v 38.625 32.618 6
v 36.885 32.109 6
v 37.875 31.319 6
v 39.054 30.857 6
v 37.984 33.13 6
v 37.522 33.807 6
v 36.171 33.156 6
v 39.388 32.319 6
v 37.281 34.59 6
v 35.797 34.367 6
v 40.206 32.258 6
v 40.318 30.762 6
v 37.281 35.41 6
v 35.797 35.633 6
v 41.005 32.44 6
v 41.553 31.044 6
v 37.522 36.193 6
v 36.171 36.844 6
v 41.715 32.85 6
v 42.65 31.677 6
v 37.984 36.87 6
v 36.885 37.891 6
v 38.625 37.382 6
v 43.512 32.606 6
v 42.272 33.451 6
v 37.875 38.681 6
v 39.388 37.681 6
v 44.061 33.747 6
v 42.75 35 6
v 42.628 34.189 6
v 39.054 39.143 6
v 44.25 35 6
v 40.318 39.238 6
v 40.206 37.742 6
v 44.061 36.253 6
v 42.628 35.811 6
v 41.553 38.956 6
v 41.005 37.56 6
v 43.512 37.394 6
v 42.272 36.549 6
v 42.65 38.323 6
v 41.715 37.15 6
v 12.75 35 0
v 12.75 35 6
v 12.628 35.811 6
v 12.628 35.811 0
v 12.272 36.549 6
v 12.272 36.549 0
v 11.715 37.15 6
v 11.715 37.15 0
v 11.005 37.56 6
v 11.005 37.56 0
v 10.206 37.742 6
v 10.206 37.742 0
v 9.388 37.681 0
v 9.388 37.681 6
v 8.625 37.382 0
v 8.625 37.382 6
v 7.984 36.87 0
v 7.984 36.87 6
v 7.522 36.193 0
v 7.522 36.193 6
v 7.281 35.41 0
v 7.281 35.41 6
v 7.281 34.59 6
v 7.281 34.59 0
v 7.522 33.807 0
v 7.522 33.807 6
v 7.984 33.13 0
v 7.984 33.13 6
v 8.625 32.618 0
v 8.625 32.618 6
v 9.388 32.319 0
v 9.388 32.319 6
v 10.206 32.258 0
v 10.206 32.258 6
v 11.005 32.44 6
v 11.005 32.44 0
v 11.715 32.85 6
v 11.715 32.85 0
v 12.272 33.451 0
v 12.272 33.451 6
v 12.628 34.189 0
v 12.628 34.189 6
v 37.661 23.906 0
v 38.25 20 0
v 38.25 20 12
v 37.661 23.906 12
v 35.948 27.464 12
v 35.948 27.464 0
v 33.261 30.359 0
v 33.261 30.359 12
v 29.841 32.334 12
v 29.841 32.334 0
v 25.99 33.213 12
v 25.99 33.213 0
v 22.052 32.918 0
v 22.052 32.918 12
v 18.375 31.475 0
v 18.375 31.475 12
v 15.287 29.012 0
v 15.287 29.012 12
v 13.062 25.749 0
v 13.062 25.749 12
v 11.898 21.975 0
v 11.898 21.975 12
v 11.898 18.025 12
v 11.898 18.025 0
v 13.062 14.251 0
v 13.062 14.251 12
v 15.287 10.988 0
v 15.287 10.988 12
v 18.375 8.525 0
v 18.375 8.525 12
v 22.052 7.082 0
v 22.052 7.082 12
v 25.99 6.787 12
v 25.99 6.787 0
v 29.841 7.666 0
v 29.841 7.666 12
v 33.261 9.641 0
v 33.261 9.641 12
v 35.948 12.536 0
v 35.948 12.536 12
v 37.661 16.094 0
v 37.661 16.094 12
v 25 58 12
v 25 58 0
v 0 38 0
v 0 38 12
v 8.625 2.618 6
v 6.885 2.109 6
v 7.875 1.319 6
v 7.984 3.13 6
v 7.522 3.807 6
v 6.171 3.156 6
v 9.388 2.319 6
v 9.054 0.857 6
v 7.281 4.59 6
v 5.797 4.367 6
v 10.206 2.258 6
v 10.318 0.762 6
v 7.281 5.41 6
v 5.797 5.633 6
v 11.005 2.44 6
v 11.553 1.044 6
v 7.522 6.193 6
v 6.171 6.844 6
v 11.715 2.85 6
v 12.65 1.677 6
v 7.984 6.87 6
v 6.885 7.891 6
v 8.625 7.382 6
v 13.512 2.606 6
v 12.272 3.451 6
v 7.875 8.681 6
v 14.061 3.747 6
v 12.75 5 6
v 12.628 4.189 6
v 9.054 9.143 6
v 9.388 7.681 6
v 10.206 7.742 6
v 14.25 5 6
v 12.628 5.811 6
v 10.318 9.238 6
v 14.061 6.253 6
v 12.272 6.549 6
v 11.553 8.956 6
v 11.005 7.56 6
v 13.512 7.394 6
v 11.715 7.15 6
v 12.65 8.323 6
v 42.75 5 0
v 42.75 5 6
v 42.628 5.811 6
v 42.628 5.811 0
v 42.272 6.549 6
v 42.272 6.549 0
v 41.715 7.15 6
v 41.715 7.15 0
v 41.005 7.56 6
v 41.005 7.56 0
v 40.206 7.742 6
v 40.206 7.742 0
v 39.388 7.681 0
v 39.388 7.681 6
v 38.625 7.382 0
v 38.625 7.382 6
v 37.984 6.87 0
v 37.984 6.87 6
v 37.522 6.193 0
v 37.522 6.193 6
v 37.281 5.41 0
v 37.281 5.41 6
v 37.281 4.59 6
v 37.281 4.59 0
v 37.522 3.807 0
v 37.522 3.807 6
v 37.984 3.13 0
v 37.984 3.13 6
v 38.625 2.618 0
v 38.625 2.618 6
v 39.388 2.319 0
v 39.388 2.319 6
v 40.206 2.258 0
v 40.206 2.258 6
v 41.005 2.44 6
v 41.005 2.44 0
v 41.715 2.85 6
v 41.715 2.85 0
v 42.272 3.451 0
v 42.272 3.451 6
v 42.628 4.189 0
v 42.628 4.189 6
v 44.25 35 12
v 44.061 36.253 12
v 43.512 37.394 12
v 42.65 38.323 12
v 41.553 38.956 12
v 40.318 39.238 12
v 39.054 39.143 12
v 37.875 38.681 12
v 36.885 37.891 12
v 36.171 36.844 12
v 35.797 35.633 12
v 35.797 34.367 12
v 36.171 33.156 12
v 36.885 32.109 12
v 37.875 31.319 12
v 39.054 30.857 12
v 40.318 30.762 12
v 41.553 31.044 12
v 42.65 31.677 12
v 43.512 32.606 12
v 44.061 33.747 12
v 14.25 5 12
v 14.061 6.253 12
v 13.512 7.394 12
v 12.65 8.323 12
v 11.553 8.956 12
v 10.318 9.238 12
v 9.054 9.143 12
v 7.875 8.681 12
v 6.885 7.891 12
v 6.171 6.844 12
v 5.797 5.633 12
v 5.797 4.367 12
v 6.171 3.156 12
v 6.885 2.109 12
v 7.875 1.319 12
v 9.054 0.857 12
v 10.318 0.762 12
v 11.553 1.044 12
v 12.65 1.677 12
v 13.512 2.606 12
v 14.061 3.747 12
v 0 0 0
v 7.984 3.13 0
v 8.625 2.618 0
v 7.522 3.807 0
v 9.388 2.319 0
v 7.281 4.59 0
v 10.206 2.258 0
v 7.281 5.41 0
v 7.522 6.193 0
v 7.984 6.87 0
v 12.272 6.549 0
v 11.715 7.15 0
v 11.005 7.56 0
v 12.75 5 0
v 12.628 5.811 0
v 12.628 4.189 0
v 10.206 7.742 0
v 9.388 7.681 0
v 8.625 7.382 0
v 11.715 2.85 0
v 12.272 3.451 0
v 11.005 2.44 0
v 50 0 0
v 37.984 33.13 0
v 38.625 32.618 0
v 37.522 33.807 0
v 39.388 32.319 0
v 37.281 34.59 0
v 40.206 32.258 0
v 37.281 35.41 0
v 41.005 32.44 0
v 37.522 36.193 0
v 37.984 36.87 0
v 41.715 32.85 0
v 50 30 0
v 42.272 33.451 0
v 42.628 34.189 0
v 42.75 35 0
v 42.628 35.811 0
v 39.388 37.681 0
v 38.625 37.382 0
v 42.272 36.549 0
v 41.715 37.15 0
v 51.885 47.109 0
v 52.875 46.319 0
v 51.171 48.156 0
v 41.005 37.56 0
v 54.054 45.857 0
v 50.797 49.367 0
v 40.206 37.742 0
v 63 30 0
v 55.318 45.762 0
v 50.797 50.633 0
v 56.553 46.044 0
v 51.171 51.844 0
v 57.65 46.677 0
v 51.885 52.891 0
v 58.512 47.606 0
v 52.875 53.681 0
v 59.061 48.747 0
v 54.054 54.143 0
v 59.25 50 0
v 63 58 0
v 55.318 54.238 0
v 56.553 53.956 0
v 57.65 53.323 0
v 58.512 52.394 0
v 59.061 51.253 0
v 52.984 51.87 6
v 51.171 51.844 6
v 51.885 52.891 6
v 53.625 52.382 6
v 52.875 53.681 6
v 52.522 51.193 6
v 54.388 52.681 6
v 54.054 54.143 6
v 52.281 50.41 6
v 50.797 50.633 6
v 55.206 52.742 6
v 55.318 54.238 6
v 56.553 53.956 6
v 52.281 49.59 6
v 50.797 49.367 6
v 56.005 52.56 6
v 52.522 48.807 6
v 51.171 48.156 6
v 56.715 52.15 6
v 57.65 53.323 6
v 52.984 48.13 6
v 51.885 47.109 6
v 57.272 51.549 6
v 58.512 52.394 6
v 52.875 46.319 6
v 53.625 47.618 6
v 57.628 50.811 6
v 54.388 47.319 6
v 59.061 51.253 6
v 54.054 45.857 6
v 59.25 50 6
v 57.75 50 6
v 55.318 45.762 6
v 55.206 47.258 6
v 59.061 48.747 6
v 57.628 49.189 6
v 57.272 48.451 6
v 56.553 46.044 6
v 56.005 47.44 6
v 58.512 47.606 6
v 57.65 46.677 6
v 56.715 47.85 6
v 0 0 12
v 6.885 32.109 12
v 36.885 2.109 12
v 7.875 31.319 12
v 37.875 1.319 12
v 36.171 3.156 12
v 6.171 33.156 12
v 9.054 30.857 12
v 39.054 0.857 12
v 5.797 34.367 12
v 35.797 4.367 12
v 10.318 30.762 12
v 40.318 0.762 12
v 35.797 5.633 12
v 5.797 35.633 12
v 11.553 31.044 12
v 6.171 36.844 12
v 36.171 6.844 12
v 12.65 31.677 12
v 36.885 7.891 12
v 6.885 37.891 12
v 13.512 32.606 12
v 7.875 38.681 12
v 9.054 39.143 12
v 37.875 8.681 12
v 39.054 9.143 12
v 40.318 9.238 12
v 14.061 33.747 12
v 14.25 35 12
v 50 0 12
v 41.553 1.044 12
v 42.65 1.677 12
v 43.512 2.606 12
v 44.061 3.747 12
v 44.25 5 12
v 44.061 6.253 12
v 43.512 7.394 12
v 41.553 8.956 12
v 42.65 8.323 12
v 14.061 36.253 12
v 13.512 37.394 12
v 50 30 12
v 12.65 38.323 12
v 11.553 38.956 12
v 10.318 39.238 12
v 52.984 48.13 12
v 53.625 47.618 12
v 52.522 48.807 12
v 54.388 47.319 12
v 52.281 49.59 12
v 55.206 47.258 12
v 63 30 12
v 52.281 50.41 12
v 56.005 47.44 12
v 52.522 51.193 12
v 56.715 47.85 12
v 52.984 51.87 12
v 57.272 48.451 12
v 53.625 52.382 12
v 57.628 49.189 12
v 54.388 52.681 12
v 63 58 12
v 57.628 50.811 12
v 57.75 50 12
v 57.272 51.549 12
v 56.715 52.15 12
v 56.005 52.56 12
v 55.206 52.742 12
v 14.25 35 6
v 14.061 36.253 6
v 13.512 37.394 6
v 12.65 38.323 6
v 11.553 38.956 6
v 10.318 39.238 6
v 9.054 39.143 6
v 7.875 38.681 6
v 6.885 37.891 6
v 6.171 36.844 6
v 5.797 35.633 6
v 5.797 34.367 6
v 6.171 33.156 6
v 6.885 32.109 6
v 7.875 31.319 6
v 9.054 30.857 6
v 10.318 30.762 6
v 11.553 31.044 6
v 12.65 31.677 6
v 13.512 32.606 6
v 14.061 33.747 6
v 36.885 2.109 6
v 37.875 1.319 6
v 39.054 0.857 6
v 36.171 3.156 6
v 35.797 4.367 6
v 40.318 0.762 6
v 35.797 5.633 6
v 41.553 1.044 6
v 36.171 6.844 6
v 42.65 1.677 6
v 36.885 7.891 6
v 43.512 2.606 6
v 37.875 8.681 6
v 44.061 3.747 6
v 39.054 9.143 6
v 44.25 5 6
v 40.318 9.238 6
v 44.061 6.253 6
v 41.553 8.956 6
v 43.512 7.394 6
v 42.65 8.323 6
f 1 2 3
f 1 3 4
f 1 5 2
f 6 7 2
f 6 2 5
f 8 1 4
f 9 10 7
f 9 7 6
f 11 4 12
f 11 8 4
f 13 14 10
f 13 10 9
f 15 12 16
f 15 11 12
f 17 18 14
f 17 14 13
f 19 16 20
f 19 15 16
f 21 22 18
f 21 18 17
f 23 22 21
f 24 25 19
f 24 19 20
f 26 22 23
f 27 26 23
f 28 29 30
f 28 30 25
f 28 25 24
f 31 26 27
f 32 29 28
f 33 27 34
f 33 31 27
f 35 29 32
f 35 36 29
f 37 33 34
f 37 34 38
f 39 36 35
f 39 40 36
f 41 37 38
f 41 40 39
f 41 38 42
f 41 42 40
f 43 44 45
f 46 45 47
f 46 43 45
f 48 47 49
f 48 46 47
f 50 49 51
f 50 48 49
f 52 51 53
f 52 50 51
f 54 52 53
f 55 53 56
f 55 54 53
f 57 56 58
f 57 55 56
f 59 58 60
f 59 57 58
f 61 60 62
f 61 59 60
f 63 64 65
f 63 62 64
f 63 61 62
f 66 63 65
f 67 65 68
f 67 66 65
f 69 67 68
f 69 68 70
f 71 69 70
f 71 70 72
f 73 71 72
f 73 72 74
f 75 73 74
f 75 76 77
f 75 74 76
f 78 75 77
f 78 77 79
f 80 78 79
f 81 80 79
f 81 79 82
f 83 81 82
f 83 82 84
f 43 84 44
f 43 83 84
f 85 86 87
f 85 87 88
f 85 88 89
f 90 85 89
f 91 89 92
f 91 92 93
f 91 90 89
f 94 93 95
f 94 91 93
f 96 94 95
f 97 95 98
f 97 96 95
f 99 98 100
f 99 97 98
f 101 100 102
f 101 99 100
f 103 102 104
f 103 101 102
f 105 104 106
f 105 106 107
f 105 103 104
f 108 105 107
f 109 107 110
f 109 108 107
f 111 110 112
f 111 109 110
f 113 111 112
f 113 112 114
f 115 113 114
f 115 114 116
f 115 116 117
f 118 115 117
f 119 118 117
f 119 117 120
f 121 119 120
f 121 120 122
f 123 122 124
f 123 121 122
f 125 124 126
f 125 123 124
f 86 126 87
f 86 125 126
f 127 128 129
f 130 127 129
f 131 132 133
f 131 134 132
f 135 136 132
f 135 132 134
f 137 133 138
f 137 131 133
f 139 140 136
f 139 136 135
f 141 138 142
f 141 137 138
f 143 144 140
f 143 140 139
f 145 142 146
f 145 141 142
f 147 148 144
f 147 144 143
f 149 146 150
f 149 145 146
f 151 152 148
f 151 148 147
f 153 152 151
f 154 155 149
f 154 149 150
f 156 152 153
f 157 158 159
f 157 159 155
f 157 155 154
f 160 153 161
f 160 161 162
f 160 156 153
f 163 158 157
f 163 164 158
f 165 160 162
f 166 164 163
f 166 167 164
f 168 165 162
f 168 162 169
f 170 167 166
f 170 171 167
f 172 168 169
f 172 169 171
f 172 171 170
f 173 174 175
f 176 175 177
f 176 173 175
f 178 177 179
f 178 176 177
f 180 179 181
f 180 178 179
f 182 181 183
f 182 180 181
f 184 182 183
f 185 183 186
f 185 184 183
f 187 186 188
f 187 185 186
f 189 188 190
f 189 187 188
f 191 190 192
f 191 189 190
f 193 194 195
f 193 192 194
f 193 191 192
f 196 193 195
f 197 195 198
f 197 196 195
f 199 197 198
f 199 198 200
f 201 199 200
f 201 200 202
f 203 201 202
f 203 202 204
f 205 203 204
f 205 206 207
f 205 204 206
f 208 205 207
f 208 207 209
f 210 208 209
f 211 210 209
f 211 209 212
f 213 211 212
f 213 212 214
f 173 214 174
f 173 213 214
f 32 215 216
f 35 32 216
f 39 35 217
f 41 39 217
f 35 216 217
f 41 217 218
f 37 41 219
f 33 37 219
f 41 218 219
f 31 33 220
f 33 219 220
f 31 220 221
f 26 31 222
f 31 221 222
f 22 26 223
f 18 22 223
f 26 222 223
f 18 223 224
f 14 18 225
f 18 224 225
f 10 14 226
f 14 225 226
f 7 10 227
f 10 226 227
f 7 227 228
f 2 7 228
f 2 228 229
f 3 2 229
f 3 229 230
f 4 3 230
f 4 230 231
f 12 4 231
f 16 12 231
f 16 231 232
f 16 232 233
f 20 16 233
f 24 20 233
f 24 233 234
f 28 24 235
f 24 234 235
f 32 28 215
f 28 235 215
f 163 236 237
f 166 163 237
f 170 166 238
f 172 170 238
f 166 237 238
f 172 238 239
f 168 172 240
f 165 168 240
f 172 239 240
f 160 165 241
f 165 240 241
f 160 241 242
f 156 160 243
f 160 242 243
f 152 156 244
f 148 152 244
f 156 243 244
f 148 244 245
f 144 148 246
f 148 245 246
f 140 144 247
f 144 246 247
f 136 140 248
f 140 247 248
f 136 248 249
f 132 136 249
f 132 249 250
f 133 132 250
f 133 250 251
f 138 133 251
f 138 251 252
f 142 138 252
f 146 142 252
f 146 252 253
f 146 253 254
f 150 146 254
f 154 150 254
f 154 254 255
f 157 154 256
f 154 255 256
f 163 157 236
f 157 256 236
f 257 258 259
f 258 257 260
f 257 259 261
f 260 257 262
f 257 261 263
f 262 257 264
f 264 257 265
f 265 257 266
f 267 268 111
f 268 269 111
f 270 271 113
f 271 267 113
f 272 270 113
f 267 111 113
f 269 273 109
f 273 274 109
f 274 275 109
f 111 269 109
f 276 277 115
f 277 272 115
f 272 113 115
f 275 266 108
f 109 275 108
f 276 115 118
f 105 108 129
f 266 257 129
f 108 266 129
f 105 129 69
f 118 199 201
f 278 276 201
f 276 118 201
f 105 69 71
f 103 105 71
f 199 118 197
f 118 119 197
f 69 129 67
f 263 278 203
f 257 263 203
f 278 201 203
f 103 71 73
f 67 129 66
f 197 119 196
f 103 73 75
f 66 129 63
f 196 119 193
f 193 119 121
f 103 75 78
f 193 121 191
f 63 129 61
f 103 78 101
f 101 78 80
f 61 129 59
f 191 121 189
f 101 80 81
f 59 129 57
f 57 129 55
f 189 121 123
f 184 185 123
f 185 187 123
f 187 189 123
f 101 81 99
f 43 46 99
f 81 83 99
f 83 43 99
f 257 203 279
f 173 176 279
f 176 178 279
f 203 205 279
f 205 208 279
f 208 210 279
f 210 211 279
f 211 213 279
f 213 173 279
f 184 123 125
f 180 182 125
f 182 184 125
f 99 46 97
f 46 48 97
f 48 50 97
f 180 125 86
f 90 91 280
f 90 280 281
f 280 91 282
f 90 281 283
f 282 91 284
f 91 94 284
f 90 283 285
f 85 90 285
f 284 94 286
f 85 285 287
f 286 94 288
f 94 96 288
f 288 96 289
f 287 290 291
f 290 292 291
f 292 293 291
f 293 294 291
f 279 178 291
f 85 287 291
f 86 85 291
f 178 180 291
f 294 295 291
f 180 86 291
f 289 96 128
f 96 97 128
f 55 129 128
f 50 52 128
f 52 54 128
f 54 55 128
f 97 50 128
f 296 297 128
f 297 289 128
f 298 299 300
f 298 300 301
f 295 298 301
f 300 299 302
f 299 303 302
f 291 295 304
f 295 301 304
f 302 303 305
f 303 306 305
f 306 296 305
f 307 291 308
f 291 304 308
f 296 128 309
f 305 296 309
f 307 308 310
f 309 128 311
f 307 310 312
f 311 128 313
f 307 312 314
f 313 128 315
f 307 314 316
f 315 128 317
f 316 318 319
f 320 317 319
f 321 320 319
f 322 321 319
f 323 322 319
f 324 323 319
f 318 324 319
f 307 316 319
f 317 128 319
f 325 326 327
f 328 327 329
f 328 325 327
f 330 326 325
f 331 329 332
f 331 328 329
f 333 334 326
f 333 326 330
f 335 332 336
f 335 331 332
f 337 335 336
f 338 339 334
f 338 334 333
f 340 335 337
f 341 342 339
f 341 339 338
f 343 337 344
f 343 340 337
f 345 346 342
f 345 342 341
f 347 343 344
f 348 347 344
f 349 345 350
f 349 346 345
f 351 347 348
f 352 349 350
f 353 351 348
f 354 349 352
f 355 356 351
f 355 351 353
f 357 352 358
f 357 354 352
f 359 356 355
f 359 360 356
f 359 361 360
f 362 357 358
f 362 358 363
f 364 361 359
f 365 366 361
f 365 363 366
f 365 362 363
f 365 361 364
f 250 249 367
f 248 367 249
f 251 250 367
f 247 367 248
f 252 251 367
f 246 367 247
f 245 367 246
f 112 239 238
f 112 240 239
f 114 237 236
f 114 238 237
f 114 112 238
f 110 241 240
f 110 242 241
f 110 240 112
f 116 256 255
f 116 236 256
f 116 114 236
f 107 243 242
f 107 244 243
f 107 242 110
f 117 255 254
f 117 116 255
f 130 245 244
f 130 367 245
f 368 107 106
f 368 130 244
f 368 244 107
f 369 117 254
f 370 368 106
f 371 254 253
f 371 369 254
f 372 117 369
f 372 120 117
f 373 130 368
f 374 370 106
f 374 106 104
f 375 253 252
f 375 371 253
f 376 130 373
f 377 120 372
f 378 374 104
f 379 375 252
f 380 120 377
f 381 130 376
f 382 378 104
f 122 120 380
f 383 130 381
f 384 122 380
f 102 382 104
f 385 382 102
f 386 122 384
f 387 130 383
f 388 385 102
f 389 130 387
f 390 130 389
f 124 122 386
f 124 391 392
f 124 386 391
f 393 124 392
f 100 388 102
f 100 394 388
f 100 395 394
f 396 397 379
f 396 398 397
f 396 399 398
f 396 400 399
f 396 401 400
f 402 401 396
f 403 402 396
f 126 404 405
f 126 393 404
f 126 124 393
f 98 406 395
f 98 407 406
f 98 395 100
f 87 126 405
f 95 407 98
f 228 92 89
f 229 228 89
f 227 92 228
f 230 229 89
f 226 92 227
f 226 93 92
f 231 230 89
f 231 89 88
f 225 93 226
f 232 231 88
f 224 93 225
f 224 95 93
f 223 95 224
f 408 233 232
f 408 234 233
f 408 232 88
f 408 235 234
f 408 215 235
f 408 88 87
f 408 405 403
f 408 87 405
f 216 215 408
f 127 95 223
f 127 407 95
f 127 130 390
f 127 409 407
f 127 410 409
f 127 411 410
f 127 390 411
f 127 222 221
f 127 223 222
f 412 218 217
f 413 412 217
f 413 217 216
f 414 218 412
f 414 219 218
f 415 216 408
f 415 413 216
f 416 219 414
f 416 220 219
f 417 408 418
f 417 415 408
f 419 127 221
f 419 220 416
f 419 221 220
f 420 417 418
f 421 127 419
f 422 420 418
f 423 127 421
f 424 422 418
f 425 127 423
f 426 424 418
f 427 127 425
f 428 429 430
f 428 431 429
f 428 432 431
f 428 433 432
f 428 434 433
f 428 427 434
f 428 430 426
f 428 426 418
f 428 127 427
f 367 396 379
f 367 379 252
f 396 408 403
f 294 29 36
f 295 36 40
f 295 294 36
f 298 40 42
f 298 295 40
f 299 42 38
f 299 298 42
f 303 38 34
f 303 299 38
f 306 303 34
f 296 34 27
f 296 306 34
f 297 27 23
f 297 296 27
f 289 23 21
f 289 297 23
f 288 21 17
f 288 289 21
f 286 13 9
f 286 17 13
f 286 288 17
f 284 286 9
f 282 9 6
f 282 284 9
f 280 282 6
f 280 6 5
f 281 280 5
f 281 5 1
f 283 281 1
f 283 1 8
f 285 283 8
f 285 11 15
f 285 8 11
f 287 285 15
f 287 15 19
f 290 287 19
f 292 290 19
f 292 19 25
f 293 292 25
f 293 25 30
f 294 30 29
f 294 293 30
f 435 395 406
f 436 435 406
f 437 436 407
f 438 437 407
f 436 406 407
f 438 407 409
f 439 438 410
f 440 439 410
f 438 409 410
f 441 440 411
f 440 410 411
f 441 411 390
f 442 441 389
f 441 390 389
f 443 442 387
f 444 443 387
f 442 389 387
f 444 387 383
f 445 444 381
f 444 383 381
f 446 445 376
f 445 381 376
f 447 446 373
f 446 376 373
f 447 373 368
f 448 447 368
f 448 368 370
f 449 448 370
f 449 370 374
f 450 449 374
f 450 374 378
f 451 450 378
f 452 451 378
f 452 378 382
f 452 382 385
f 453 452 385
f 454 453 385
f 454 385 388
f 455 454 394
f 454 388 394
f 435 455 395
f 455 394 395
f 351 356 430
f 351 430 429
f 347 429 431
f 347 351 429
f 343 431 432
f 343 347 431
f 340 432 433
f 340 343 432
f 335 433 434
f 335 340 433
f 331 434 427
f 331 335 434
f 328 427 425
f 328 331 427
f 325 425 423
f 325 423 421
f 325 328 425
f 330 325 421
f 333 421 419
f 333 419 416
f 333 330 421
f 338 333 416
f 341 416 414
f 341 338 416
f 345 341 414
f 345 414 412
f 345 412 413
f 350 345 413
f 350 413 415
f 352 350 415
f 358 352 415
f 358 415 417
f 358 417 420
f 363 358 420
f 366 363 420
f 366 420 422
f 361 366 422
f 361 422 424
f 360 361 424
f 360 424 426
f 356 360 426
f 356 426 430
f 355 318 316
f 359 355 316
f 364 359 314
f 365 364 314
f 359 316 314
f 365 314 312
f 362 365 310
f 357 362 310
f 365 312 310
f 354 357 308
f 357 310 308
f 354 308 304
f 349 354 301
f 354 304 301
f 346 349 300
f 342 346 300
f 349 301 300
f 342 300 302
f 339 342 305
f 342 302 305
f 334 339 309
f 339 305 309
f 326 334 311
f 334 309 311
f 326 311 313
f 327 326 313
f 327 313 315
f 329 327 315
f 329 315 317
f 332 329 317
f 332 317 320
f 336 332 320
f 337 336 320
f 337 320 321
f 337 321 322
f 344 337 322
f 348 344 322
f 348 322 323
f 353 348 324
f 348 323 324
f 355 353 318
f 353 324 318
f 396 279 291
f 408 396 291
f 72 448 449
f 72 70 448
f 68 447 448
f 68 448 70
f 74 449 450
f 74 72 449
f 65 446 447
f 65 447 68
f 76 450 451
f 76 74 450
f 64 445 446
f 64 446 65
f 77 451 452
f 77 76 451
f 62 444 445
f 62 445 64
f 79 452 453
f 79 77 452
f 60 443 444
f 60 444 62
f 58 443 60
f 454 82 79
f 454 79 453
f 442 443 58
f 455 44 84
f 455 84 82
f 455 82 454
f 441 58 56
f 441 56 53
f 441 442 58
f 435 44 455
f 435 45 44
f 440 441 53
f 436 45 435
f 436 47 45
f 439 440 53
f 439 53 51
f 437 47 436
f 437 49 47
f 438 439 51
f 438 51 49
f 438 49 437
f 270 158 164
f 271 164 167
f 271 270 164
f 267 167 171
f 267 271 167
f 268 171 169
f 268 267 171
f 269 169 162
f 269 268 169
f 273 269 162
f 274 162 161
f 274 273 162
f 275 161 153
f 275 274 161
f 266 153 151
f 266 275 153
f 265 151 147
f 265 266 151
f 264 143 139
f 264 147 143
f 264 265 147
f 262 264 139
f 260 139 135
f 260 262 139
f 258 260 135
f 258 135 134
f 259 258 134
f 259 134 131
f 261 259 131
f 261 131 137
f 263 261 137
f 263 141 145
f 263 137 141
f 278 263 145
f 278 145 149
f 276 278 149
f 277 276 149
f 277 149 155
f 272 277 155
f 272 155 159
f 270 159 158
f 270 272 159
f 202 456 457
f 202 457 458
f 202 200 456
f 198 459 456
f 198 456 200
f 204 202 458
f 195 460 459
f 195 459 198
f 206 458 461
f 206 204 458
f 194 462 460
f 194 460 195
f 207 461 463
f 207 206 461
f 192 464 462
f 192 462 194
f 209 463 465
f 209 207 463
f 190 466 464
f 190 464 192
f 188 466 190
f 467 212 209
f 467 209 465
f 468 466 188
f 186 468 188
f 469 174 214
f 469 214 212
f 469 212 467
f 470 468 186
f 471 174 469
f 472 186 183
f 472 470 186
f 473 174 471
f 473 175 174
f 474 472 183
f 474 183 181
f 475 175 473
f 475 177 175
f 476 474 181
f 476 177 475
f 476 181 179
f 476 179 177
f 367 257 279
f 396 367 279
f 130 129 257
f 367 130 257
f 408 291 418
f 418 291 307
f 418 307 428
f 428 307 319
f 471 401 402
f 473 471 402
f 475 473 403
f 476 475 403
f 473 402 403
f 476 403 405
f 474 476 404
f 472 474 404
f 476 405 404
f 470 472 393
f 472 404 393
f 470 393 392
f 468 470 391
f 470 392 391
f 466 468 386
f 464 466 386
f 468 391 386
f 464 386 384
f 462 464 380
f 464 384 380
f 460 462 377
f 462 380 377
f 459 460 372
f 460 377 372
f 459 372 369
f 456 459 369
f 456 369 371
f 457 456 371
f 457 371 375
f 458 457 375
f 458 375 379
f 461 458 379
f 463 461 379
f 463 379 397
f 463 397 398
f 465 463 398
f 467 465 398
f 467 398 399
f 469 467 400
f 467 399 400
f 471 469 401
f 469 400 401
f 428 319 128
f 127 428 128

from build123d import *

# Parameters (mm, degrees)
F0_R     = 2.75
F0_R_2   = 13.25
F1_DEPTH = 12
F2_R     = 4.25
F3_DEPTH = 6
F4_R     = 4.25
F5_DEPTH = 6


with BuildPart() as f1:
    # F0 (on Top) → F1 (new body)
    with BuildSketch(Plane.XY):
        Polygon((0, 38), (0, 0), (50, 0), (50, 30), (63, 30), (63, 58), (25, 58), align=None)
        with Locations((10, 5)):
            Circle(F0_R, mode=Mode.SUBTRACT)
        with Locations((25, 20)):
            Circle(F0_R_2, mode=Mode.SUBTRACT)
        with Locations((40, 5)):
            Circle(F0_R, mode=Mode.SUBTRACT)
        with Locations((10, 35)):
            Circle(F0_R, mode=Mode.SUBTRACT)
        with Locations((40, 35)):
            Circle(F0_R, mode=Mode.SUBTRACT)
        with Locations((55, 50)):
            Circle(F0_R, mode=Mode.SUBTRACT)
    extrude(amount=F1_DEPTH)

    # F2 (on face) → F3 (cut)
    with BuildSketch(Plane.XY.offset(12)):
        with Locations((10, 35)):
            Circle(F2_R)
        with Locations((40, 35)):
            Circle(F2_R)
        with Locations((10, 5)):
            Circle(F2_R)
        with Locations((40, 5)):
            Circle(F2_R)
    extrude(amount=-F3_DEPTH, mode=Mode.SUBTRACT)

    # F4 (on face) → F5 (cut)
    with BuildSketch(Plane(origin=(0, 0, 0), x_dir=(1, 0, 0), z_dir=(0, 0, -1))):
        with Locations((55, -50)):
            Circle(F4_R)
    extrude(amount=-F5_DEPTH, mode=Mode.SUBTRACT)


solid = f1.part
